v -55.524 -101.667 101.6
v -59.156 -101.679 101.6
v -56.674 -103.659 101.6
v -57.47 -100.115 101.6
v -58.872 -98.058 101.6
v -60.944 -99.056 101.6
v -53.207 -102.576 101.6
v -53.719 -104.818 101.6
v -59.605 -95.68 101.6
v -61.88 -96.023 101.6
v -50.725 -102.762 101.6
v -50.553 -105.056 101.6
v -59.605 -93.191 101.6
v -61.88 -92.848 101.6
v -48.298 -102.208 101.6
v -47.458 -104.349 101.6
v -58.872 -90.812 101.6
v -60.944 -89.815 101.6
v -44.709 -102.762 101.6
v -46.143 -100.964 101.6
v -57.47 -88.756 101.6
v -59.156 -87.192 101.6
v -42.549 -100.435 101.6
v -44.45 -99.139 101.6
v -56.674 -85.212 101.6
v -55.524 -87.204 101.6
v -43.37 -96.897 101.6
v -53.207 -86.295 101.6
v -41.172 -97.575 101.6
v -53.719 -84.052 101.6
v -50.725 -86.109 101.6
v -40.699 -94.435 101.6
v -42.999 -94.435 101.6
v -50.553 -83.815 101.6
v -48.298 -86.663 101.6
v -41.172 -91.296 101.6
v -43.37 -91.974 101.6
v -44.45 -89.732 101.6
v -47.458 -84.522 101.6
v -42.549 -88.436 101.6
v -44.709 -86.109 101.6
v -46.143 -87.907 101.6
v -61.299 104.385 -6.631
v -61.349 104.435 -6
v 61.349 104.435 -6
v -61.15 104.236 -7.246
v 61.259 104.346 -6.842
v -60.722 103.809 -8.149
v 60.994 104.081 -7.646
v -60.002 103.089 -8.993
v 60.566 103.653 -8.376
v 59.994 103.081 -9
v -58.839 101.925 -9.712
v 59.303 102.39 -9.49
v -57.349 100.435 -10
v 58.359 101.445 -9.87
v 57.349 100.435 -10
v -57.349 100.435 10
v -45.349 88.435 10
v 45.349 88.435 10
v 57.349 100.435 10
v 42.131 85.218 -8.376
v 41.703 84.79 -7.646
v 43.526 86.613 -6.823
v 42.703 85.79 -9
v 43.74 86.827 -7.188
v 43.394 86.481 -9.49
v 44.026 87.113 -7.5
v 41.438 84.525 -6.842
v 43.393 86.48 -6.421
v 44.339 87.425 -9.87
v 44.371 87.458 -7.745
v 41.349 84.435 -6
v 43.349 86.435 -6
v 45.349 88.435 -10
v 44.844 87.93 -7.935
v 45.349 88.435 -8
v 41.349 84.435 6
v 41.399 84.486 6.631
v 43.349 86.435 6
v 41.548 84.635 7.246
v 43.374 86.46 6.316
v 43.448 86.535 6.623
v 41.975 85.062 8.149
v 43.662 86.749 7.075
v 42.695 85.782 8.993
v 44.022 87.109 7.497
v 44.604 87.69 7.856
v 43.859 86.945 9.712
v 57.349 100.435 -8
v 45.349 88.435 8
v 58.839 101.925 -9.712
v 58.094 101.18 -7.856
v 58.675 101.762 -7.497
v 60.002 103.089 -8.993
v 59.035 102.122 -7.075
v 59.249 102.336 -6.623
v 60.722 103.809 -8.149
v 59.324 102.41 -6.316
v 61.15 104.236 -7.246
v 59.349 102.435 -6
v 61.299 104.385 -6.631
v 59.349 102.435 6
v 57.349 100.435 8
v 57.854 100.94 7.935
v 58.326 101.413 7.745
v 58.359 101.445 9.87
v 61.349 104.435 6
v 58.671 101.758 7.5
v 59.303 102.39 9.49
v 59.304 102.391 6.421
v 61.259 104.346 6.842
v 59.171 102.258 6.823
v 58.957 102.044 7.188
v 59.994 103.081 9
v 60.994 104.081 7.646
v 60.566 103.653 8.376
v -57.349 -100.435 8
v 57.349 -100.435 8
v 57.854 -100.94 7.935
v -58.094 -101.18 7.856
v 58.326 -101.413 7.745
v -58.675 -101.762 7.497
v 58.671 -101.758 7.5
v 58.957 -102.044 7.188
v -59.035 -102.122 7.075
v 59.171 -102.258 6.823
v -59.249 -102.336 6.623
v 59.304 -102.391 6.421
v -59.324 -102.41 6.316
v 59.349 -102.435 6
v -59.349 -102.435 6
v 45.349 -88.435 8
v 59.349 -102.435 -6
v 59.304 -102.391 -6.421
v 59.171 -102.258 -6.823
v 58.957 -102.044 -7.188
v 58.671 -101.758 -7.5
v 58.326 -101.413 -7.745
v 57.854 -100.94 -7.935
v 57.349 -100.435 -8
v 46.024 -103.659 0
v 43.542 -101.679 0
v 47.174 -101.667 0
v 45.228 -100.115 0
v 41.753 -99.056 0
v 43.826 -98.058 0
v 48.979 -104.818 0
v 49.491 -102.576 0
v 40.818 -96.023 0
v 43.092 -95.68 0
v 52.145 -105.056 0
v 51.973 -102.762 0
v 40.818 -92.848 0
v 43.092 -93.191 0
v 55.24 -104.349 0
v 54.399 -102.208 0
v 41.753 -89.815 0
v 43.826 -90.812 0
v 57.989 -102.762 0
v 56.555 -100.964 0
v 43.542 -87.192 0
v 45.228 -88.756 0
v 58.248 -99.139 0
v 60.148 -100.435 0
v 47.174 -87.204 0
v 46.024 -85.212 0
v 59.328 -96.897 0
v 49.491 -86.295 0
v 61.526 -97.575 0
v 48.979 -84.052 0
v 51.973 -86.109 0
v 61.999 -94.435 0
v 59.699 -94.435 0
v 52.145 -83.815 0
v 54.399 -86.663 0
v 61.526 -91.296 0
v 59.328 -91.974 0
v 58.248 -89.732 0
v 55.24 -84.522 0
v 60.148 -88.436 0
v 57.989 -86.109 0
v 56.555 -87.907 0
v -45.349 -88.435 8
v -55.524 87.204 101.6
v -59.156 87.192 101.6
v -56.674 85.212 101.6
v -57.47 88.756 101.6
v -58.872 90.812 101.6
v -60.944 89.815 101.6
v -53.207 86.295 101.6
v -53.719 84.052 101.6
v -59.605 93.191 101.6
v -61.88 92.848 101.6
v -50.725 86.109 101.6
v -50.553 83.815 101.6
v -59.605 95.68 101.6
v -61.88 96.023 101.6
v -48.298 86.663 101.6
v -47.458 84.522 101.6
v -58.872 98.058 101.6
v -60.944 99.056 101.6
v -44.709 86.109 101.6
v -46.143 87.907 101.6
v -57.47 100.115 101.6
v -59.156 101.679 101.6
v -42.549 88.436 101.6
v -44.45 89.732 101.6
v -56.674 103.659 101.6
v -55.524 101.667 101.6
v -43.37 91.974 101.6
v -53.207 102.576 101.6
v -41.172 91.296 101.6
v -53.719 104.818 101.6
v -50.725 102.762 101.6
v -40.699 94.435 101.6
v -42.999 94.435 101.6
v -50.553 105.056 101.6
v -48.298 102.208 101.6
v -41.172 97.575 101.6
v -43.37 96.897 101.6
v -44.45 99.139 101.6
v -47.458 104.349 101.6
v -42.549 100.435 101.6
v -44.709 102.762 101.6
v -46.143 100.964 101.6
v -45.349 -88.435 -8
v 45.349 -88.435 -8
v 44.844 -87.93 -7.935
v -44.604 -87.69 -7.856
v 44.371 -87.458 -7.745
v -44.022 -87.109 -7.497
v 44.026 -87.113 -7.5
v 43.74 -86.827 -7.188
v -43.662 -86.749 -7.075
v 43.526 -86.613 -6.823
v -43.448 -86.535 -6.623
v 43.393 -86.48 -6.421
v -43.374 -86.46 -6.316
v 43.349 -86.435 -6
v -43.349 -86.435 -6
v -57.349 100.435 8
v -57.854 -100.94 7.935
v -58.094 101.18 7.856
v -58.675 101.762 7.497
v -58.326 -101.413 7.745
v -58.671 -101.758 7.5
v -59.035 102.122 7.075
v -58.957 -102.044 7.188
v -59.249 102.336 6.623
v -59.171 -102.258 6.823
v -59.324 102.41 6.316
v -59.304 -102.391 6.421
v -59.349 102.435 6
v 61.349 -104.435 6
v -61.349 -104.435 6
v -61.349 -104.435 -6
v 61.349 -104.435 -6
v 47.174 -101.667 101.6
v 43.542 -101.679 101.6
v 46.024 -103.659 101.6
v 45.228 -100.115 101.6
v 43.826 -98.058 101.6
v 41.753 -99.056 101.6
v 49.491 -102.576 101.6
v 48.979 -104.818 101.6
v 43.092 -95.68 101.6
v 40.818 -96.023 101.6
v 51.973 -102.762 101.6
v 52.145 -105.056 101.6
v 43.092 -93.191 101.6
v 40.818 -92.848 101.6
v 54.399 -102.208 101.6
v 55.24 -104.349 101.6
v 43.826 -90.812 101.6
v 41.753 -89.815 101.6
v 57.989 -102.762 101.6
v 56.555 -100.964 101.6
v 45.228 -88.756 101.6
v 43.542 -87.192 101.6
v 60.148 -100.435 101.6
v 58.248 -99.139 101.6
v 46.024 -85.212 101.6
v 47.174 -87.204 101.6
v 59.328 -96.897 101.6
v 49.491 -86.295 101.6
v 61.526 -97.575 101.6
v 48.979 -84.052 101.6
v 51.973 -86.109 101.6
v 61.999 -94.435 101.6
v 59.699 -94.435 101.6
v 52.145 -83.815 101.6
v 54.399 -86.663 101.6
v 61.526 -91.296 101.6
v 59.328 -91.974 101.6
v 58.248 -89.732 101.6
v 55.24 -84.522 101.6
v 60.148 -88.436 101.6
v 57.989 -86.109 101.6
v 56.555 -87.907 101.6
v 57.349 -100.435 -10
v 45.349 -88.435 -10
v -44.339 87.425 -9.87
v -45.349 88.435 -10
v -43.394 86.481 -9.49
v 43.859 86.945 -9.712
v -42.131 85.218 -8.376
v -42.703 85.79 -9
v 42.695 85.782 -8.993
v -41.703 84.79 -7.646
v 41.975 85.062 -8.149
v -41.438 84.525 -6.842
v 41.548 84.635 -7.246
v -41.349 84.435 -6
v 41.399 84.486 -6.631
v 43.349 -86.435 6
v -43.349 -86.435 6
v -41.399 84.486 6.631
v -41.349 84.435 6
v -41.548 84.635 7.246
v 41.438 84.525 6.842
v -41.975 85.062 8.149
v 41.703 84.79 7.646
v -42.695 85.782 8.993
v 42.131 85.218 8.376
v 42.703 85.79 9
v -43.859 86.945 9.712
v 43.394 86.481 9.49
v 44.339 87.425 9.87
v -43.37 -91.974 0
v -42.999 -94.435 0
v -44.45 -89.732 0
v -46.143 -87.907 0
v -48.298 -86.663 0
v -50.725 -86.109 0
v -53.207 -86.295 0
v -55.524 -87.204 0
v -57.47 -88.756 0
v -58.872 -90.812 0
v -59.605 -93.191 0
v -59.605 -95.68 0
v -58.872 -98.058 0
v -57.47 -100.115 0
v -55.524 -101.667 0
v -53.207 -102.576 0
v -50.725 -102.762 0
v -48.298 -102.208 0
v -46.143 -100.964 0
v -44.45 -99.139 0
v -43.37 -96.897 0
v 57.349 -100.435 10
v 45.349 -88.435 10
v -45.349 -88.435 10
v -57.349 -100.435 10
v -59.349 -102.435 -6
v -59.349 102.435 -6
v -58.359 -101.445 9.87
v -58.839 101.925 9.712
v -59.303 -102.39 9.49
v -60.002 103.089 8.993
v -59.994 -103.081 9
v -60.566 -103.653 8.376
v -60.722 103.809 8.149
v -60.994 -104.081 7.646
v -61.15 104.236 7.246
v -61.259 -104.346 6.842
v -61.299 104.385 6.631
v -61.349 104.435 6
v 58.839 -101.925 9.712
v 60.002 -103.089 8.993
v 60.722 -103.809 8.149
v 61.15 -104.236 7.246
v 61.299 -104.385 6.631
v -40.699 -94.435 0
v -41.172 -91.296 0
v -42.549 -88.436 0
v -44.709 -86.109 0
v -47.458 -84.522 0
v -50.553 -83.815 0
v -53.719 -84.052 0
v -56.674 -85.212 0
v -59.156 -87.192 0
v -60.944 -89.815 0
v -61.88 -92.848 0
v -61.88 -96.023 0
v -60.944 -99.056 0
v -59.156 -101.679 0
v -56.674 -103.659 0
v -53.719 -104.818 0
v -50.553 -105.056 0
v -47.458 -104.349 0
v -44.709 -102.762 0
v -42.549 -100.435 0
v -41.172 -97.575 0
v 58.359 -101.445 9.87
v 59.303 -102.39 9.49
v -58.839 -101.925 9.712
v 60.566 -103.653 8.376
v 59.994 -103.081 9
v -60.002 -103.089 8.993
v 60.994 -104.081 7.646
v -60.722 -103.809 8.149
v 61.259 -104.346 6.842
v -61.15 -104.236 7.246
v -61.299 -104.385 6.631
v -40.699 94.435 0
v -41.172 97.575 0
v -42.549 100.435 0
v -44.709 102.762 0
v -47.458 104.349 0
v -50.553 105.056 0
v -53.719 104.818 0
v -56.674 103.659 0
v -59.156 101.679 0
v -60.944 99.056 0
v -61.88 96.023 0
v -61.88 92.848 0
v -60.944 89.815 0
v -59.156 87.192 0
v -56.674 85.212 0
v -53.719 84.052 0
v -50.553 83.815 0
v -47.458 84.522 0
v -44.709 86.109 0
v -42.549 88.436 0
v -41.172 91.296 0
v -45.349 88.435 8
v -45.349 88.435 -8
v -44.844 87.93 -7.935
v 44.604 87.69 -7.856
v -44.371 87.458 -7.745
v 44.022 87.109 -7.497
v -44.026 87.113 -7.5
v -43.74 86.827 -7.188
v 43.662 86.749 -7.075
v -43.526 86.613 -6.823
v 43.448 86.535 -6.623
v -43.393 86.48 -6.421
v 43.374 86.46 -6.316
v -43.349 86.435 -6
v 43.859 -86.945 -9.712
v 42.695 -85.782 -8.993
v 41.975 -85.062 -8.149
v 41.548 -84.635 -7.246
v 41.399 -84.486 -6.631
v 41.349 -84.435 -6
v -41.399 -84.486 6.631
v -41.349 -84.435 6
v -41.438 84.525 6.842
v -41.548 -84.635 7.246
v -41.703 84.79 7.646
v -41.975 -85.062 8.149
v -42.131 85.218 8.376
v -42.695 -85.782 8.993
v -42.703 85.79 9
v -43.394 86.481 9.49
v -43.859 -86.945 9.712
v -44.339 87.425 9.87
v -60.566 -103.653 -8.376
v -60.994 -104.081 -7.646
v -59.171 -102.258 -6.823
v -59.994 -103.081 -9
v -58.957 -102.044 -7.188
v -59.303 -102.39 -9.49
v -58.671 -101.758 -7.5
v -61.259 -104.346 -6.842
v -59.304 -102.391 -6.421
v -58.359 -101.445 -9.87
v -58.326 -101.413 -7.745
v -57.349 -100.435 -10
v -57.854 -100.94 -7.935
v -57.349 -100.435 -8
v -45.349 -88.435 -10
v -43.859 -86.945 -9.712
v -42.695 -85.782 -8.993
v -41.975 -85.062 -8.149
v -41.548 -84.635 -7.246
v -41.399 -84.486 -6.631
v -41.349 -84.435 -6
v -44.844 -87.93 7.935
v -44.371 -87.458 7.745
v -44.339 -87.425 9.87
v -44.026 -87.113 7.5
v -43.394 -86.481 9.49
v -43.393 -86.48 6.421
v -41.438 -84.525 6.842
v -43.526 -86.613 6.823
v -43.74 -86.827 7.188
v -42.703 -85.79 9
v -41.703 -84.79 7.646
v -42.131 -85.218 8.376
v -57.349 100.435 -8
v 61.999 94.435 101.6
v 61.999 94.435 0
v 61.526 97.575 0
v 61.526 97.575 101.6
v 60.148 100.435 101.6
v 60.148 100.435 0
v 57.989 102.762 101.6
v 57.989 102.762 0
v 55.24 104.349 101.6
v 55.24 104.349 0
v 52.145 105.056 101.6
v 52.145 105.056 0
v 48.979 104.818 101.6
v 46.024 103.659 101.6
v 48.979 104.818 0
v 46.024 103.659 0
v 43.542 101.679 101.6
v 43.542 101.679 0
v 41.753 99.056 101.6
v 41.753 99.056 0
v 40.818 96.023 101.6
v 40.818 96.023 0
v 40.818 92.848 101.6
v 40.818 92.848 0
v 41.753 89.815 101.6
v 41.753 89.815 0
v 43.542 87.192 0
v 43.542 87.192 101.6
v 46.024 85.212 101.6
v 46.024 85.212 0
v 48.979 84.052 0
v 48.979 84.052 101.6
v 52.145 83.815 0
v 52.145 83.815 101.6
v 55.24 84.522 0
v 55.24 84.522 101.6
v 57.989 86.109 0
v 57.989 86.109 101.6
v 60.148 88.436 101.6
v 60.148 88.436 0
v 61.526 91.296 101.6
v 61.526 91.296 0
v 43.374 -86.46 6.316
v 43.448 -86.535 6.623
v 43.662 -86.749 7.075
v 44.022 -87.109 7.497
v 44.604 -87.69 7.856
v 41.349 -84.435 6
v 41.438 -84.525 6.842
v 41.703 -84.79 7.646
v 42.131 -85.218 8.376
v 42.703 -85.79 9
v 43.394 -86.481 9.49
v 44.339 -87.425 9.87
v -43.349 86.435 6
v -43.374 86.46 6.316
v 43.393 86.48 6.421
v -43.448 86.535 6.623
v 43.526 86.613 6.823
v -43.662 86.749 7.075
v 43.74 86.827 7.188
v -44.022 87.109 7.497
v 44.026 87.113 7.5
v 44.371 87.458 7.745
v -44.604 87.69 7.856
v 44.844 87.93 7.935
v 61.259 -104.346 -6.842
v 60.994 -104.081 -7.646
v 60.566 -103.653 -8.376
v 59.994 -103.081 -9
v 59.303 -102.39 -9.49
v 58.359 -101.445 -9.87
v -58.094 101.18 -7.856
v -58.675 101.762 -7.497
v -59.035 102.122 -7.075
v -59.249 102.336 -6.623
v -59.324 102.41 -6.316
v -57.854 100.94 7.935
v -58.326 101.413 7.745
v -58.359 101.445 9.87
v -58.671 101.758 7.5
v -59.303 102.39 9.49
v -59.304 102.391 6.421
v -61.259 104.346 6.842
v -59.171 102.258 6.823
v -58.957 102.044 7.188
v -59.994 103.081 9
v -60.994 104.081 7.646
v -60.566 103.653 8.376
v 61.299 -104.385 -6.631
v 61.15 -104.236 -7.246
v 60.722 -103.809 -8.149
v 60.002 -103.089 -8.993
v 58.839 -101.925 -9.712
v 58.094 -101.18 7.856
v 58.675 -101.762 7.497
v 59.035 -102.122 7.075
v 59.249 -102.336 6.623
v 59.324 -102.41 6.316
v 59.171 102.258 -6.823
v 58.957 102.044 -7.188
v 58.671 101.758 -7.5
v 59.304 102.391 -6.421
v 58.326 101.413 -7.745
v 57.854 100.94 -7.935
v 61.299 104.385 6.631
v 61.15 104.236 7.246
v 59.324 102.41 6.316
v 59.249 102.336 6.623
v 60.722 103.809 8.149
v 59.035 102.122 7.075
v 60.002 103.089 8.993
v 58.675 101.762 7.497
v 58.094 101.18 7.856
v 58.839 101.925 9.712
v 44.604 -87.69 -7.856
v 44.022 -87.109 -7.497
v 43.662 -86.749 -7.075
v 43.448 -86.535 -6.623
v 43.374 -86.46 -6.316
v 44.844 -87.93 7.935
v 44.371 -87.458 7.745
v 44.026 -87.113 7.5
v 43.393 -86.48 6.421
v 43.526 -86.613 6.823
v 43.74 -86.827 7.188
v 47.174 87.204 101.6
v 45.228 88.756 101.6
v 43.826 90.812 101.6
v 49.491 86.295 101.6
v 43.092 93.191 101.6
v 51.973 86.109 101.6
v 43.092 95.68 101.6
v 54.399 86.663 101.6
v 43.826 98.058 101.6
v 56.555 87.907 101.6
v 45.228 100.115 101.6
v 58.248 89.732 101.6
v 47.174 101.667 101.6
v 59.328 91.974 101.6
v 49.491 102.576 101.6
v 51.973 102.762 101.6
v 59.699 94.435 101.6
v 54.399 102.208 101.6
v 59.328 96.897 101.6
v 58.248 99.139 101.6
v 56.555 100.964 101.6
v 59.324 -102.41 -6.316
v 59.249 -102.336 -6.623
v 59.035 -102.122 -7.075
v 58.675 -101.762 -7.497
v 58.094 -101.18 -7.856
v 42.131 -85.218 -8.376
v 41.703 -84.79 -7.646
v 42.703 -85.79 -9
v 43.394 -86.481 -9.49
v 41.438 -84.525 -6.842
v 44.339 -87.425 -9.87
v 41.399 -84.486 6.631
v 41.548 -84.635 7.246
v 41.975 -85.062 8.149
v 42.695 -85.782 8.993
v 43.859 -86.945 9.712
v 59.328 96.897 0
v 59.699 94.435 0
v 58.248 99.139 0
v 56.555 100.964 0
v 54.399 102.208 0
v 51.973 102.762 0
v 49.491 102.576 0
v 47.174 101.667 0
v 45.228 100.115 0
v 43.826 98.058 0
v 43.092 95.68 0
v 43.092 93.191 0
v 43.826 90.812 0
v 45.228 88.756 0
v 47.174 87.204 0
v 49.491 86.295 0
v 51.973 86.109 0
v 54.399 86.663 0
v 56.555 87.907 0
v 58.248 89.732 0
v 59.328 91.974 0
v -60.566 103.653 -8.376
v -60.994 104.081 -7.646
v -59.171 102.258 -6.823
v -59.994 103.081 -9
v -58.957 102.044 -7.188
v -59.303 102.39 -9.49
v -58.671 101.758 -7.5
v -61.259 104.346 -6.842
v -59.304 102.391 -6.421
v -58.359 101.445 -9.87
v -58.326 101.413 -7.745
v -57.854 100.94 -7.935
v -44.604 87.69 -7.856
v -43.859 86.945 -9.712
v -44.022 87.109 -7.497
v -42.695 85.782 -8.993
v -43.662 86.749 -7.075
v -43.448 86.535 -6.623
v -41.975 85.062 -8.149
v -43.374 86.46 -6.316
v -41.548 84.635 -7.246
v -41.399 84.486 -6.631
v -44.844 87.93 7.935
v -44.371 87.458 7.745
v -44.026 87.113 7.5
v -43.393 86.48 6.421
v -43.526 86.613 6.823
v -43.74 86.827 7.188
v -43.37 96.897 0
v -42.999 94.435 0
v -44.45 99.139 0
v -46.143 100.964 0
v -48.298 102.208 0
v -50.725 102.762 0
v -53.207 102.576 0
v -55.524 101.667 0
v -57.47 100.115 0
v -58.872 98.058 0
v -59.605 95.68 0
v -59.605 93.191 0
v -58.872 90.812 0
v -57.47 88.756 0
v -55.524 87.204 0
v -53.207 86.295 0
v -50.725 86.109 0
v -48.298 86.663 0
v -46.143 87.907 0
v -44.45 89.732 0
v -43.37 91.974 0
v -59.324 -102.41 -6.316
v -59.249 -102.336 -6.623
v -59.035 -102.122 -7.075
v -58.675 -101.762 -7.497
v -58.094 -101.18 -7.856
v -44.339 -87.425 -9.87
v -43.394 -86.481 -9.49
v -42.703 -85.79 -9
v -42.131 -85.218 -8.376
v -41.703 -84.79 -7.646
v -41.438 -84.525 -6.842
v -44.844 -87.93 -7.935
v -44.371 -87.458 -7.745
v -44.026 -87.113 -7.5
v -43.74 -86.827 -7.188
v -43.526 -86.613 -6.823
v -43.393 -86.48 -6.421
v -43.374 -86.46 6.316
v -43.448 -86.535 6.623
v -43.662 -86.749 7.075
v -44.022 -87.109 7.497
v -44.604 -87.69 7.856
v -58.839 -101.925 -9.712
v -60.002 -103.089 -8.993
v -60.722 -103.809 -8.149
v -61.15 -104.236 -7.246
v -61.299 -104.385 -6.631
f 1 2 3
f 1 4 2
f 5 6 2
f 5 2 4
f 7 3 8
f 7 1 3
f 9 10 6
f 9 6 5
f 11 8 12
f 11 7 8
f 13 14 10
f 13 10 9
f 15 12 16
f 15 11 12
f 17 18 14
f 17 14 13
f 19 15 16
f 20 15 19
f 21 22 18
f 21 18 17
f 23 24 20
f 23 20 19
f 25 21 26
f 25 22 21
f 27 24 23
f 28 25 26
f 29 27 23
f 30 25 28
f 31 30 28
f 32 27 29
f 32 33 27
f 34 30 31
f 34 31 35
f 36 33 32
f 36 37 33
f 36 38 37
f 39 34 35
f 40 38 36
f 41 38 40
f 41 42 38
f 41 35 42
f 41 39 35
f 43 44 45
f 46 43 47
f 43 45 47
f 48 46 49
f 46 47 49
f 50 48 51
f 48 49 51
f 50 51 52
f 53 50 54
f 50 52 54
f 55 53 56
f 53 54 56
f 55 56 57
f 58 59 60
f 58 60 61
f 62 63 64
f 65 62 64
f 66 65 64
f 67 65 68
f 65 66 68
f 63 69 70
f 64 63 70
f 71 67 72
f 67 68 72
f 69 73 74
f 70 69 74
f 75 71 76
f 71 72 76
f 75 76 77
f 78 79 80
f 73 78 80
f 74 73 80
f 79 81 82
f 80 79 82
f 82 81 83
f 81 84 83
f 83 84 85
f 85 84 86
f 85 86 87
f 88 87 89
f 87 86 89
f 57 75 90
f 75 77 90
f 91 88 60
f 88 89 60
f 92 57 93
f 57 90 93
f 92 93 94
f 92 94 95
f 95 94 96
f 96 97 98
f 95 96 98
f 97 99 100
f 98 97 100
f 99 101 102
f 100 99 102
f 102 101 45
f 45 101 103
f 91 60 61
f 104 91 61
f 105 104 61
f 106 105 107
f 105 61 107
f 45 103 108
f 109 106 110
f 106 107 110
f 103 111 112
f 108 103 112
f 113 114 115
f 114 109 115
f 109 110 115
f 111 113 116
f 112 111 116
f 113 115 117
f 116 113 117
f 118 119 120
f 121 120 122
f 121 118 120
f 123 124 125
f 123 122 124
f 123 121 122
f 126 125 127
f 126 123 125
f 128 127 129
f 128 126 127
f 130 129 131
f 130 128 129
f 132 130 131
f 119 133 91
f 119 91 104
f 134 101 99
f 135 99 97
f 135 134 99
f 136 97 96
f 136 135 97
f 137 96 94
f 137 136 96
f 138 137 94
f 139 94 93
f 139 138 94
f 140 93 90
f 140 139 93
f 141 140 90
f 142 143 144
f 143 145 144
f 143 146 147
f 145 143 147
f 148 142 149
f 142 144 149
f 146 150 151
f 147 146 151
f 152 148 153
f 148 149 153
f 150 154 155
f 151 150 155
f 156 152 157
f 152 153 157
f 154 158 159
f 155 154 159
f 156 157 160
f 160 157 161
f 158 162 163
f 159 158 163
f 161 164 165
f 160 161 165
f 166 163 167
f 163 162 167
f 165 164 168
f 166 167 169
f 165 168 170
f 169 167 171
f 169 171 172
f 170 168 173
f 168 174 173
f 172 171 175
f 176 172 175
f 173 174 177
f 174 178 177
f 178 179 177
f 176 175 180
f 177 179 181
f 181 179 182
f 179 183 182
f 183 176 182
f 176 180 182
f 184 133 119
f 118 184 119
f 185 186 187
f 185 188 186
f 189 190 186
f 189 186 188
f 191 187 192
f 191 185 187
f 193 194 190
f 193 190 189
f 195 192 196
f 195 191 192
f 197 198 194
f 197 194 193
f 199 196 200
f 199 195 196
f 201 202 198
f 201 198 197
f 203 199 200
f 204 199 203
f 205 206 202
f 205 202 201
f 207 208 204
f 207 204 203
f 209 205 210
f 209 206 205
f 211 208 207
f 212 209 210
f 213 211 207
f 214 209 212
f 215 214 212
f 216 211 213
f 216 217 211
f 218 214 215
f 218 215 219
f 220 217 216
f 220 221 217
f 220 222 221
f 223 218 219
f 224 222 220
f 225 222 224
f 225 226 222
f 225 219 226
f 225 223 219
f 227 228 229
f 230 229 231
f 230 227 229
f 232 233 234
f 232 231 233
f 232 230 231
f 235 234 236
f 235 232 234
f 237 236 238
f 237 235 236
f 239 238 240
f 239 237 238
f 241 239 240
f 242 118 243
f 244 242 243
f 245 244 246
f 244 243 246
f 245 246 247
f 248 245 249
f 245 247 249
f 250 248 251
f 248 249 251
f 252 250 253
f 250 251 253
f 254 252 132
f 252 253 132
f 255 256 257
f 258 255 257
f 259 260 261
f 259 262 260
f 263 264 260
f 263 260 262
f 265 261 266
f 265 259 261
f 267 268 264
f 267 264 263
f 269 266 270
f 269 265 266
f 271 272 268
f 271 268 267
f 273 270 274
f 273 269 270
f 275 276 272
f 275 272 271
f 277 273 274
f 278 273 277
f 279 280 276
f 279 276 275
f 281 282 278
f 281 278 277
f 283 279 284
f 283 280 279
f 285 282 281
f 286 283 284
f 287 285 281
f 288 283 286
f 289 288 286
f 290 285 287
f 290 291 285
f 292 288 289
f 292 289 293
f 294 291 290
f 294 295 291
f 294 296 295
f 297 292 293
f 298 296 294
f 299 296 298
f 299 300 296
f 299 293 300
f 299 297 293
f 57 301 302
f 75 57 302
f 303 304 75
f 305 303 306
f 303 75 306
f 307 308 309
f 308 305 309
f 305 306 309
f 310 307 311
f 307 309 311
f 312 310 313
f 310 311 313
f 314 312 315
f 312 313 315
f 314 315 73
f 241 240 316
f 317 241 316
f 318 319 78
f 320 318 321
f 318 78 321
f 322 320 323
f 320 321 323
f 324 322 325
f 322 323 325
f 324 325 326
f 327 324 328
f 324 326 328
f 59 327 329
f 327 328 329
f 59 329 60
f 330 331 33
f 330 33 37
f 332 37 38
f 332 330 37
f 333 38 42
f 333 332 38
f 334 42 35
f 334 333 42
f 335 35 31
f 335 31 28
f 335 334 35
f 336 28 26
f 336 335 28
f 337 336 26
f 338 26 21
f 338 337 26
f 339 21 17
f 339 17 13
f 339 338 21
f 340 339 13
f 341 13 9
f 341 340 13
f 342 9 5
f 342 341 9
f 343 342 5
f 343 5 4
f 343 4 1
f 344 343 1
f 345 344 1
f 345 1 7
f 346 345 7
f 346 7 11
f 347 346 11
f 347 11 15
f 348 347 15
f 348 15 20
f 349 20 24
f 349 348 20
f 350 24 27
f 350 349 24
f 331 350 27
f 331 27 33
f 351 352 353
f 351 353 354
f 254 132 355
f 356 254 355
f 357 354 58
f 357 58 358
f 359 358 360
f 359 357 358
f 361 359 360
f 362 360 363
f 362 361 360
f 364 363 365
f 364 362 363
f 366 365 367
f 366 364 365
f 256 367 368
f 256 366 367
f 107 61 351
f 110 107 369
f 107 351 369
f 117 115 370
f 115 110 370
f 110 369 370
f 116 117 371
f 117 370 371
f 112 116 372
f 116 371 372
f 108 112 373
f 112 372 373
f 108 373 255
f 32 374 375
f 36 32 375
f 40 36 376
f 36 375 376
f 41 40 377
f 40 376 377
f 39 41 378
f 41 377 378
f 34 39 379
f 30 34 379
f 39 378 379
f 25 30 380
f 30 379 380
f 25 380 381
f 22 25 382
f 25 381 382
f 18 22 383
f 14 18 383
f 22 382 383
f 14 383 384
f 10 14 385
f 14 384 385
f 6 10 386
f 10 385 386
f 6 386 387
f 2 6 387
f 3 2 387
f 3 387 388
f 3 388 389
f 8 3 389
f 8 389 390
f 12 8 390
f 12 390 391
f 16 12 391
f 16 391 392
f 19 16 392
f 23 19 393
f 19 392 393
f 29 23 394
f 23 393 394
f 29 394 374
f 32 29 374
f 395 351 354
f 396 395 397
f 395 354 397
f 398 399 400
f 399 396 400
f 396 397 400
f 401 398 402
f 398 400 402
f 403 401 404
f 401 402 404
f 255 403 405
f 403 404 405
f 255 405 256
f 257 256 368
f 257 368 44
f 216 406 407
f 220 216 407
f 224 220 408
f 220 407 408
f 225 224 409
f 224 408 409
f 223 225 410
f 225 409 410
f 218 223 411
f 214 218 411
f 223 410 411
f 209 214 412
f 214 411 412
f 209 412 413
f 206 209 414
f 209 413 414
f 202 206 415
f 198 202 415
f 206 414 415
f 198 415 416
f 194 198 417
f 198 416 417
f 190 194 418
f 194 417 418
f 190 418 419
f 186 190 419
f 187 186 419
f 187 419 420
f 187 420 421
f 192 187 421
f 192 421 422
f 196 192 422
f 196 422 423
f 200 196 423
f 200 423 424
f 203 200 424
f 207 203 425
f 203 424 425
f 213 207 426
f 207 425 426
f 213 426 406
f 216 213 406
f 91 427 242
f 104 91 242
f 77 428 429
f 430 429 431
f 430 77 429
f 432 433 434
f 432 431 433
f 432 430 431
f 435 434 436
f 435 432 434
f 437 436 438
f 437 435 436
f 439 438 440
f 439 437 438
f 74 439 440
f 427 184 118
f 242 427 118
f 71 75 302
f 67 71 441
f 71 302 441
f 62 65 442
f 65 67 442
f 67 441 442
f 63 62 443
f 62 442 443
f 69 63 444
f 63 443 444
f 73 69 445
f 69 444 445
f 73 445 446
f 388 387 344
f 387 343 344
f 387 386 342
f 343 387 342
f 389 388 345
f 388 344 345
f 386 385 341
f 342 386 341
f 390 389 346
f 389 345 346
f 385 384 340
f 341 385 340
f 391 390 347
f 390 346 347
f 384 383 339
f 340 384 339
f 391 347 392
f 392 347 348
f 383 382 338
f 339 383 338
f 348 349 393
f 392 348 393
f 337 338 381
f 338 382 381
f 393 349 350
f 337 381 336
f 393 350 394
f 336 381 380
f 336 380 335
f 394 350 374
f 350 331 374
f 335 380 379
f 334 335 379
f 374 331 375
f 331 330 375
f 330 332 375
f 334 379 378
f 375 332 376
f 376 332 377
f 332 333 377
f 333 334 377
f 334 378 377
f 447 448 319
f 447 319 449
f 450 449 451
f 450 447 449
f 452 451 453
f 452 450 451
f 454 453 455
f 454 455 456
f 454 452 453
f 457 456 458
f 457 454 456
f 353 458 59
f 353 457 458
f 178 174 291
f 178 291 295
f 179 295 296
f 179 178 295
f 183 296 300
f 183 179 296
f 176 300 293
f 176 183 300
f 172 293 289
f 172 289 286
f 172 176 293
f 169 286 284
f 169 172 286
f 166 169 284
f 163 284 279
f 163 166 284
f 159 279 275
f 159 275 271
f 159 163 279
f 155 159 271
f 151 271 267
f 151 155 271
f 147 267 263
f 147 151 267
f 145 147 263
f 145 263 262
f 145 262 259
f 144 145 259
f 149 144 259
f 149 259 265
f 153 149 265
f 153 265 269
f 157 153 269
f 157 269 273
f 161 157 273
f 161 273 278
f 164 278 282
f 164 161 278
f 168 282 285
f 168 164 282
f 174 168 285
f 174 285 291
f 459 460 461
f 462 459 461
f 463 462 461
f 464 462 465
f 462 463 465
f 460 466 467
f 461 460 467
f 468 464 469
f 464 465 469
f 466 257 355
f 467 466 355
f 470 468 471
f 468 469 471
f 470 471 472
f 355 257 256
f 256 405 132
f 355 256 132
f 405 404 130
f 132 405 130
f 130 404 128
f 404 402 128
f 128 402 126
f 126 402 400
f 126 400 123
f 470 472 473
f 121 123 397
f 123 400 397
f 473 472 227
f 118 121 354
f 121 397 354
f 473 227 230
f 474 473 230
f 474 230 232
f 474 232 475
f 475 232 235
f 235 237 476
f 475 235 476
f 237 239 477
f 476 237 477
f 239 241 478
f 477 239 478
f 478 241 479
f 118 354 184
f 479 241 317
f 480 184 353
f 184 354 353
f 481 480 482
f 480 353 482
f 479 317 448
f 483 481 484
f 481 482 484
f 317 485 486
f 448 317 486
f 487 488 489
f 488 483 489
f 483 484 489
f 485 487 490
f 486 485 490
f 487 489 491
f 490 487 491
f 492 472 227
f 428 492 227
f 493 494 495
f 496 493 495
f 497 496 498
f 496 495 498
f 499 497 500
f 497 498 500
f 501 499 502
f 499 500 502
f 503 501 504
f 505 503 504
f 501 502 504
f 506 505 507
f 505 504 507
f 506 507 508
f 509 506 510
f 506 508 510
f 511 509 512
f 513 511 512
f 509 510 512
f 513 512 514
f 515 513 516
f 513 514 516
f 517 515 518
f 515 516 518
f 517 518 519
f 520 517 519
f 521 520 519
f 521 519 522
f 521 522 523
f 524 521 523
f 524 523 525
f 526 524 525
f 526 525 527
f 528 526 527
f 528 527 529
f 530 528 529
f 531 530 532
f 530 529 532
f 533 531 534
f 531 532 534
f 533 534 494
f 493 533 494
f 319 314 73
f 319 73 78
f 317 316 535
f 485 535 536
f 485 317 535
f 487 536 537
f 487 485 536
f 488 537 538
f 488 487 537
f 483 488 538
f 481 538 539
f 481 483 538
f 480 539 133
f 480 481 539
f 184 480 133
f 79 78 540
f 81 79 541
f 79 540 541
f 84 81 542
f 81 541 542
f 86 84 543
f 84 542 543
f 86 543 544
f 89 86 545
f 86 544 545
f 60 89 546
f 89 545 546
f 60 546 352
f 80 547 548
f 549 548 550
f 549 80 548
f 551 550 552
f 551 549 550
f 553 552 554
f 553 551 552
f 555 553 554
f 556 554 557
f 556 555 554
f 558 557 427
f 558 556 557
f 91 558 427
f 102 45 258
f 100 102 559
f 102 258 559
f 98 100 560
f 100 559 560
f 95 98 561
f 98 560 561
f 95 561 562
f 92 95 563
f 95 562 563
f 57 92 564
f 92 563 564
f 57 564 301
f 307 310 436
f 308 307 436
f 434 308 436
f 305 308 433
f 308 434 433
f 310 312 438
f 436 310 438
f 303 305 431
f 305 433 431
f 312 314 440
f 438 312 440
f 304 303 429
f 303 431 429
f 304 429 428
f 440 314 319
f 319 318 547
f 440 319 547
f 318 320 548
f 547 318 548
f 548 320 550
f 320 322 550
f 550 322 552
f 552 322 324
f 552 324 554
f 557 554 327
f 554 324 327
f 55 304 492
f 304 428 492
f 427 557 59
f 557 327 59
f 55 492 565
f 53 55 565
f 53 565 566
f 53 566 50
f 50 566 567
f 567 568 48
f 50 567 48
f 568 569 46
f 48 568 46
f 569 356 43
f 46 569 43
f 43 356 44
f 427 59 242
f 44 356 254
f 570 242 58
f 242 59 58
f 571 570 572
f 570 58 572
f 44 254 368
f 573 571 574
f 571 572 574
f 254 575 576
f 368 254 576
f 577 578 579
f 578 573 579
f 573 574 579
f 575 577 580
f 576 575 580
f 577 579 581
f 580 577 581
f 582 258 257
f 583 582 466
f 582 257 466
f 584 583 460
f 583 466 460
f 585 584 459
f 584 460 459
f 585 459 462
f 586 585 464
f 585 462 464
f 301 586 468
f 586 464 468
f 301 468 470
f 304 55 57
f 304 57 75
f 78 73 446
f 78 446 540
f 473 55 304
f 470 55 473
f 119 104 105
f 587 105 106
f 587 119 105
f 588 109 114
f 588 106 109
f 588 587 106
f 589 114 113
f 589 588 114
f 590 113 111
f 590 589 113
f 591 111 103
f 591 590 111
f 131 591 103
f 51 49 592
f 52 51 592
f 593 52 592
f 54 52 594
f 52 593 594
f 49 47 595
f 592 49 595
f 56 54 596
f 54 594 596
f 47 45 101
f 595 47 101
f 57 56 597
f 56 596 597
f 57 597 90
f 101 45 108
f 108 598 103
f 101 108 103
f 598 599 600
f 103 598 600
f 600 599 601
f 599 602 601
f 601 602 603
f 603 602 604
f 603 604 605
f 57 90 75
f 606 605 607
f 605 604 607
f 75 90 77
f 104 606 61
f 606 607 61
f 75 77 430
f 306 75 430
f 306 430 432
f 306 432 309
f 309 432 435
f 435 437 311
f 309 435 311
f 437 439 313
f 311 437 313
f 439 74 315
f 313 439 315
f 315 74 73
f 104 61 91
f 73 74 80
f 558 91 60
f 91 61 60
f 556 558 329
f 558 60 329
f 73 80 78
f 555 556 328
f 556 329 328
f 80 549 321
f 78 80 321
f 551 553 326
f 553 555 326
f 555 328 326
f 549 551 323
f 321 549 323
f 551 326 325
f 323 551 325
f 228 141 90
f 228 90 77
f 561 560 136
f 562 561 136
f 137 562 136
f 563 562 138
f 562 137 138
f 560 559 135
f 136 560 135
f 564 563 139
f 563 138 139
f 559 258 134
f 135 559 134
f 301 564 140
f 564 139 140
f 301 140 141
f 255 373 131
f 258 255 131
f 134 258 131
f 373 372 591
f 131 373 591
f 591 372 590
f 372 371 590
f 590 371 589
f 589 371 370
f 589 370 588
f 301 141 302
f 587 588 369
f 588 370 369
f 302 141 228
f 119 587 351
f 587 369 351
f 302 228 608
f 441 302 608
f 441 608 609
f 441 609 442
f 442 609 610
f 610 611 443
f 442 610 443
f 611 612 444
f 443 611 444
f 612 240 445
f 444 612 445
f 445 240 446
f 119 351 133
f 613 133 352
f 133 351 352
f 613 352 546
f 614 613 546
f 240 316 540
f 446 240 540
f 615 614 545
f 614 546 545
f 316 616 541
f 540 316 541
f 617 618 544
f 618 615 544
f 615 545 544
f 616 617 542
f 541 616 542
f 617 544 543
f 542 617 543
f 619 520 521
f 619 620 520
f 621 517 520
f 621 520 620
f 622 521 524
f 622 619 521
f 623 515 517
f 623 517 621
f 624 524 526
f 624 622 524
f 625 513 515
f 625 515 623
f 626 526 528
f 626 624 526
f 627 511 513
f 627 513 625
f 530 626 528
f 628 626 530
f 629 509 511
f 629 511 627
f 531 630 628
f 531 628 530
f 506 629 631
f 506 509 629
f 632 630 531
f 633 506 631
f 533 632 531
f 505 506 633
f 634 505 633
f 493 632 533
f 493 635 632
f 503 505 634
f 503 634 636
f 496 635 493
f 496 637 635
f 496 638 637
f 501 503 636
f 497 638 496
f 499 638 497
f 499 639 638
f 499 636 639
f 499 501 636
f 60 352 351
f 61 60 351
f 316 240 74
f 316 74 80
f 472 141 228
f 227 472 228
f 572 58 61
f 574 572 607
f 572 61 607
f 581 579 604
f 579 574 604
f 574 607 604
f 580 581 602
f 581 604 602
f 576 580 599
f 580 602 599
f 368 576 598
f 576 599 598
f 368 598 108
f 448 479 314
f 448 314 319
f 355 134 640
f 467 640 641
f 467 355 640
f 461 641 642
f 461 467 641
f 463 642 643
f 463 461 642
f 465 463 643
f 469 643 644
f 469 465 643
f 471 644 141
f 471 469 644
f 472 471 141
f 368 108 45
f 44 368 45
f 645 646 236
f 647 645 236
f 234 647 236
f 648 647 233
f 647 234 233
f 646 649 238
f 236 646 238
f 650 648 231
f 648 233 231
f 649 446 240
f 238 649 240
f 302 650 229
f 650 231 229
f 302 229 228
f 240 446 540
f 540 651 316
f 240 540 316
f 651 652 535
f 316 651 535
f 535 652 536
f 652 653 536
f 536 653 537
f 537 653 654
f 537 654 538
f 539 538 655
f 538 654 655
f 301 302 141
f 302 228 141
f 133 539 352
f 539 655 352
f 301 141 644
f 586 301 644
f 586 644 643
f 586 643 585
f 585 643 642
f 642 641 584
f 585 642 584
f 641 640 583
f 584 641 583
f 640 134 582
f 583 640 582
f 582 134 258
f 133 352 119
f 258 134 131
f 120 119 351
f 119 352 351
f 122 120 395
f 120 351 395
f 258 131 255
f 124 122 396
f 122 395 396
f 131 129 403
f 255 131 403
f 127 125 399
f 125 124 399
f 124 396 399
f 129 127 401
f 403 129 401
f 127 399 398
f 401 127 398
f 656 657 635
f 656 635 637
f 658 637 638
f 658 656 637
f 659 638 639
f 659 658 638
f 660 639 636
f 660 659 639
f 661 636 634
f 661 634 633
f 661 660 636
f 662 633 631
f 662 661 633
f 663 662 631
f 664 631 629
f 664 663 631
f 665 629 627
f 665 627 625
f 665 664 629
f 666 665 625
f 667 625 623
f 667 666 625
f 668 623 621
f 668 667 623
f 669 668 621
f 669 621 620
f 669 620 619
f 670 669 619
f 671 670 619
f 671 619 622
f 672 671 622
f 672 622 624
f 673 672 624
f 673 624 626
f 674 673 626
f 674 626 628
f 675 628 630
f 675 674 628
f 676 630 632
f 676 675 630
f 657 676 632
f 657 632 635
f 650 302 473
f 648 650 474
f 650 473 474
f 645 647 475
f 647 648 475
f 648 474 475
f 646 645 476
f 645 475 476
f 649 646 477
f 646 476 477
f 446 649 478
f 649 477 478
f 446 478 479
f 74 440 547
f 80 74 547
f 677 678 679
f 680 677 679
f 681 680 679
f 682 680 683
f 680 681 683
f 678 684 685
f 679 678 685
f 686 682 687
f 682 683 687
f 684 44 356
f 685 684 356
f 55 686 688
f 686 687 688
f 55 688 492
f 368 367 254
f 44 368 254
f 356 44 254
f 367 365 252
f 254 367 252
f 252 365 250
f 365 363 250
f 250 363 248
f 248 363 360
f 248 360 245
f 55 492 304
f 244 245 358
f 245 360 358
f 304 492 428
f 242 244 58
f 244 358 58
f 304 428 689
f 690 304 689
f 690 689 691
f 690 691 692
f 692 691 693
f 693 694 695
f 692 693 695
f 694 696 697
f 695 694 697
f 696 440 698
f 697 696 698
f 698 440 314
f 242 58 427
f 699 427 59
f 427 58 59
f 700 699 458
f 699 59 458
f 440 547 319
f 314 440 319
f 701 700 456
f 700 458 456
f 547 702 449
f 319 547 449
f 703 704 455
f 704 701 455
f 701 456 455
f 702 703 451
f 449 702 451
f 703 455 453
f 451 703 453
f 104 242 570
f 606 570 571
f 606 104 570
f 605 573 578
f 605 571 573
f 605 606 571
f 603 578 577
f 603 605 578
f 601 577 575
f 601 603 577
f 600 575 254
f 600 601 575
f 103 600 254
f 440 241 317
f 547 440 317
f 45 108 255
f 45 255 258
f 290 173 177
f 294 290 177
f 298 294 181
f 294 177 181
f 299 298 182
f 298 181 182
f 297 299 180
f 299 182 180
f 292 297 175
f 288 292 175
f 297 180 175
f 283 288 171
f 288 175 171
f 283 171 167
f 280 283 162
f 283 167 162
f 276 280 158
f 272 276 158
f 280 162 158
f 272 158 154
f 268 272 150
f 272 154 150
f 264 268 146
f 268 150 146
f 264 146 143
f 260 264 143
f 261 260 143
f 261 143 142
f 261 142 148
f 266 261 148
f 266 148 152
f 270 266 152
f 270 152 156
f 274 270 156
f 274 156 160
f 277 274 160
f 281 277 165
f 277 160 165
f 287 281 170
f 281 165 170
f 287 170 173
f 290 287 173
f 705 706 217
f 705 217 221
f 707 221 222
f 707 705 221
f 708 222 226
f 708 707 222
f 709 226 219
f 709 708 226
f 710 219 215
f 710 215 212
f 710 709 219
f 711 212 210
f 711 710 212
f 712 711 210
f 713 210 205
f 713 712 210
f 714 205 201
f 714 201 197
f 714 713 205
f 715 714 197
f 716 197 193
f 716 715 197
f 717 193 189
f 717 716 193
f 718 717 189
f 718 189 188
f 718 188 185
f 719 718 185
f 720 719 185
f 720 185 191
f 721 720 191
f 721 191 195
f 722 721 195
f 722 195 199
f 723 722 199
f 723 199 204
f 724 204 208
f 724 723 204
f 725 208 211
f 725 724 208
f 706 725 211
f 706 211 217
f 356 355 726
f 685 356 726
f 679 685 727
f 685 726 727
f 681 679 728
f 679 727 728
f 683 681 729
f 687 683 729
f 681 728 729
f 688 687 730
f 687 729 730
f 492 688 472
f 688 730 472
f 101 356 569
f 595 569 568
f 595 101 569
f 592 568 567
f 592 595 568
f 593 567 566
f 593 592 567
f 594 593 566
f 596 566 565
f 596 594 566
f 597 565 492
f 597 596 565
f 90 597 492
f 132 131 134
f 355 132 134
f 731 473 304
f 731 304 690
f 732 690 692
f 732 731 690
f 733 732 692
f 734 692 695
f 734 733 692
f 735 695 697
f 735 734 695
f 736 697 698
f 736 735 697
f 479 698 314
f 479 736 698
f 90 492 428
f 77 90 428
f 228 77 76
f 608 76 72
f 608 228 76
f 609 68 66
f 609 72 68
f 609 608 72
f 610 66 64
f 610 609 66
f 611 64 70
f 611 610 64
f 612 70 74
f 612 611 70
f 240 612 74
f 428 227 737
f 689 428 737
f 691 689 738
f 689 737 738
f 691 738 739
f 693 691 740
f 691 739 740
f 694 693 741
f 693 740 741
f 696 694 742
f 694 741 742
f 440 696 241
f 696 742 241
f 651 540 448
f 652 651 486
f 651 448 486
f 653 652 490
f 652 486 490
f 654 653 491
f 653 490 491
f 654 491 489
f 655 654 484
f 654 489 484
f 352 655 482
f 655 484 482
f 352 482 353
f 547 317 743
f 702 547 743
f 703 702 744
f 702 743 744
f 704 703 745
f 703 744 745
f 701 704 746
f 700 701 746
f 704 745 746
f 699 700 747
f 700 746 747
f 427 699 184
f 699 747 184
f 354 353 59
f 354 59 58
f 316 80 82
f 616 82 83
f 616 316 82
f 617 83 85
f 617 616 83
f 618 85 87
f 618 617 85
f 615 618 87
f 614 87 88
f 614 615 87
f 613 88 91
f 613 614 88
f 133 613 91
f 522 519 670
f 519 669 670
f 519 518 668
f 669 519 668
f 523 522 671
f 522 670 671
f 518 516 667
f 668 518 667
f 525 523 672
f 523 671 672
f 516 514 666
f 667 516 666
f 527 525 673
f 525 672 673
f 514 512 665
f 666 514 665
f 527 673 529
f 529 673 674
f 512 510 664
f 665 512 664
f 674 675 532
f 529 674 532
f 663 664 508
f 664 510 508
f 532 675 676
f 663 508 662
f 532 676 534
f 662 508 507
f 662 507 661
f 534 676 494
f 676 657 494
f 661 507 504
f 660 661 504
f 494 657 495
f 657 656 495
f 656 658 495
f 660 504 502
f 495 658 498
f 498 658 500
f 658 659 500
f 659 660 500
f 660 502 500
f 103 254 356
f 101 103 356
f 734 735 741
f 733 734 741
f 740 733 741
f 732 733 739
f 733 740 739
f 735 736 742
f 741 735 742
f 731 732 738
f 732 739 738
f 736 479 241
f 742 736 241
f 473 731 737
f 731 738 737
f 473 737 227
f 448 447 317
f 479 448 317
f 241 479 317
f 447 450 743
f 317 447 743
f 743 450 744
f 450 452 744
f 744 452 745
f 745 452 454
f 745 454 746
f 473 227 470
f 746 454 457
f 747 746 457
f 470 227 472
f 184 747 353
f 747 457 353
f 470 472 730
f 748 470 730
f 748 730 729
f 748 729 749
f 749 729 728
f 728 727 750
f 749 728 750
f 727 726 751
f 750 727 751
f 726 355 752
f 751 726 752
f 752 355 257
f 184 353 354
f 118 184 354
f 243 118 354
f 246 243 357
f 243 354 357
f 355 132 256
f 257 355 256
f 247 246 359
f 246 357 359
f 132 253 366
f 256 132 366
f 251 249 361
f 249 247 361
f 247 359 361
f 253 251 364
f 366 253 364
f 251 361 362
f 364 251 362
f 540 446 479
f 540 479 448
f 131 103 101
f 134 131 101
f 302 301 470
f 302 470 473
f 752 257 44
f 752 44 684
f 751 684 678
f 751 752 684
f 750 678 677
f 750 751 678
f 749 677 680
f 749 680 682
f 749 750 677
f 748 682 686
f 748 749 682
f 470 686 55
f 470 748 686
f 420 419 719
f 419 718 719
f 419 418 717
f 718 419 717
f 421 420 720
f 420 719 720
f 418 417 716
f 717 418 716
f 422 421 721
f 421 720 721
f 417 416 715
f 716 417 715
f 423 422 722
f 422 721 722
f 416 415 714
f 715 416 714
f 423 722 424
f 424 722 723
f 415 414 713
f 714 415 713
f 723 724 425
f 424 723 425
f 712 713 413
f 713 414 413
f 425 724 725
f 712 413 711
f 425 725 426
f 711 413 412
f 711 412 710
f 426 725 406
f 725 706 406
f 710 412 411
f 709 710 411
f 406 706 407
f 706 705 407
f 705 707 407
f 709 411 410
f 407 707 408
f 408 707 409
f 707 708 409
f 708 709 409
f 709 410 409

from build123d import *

# Parameters (mm, degrees)
STRUCTURAL_MEMBER1_DEPTH      = 204.012968698
STRUCTURAL_MEMBER1_DEPTH_BACK = 15.142135624
STRUCTURAL_MEMBER1_2_DEPTH    = 132.981628501
STRUCTURAL_MEMBER1_3_DEPTH    = 219.155104322
STRUCTURAL_MEMBER1_4_DEPTH    = 132.981628501
SKETCH19_R                    = 10.65
SKETCH19_R_2                  = 8.35
STRUCTURAL_MEMBER2_DEPTH      = 101.6
SKETCH19_ON_SEGMENT_2_R       = 10.65
SKETCH19_ON_SEGMENT_2_R_2     = 8.35
STRUCTURAL_MEMBER2_2_DEPTH    = 101.6
SKETCH19_ON_SEGMENT_3_R       = 10.65
SKETCH19_ON_SEGMENT_3_R_2     = 8.35
STRUCTURAL_MEMBER2_3_DEPTH    = 101.6
SKETCH19_ON_SEGMENT_4_R       = 10.65
SKETCH19_ON_SEGMENT_4_R_2     = 8.35
STRUCTURAL_MEMBER2_4_DEPTH    = 101.6


with BuildPart() as part:
    # Sketch18 → Structural Member1 (new, two sides)
    with BuildSketch(Plane(origin=(-51.348678627, 94.435416537, 0), x_dir=(1, 0, 0), z_dir=(0, -1, 0))) as structural_member1_sk:
        with BuildLine():
            Line((-6, -10), (6, -10))
            ThreePointArc((6, -10), (8.828427125, -8.828427125), (10, -6))
            Line((10, -6), (10, 6))
            ThreePointArc((10, 6), (8.828427125, 8.828427125), (6, 10))
            Line((6, 10), (-6, 10))
            ThreePointArc((-6, 10), (-8.828427125, 8.828427125), (-10, 6))
            Line((-10, 6), (-10, -6))
            ThreePointArc((-10, -6), (-8.828427125, -8.828427125), (-6, -10))
        make_face()
        with BuildLine():
            Line((-6, -8), (6, -8))
            ThreePointArc((6, -8), (7.414213562, -7.414213562), (8, -6))
            Line((8, -6), (8, 6))
            ThreePointArc((8, 6), (7.414213562, 7.414213562), (6, 8))
            Line((6, 8), (-6, 8))
            ThreePointArc((-6, 8), (-7.414213562, 7.414213562), (-8, 6))
            Line((-8, 6), (-8, -6))
            ThreePointArc((-8, -6), (-7.414213562, -7.414213562), (-6, -8))
        make_face(mode=Mode.SUBTRACT)
    extrude(amount=STRUCTURAL_MEMBER1_DEPTH)
    extrude(structural_member1_sk.sketch, amount=-STRUCTURAL_MEMBER1_DEPTH_BACK)

    # Structural Member1 mitre 1
    split(bisect_by=Plane(origin=(-51.348678627, 94.435416537, 0), x_dir=(0.707106781, -0.707106781, 0), z_dir=(-0.707106781, -0.707106781, 0)), keep=Keep.TOP)

    # Structural Member1 mitre 2
    split(bisect_by=Plane(origin=(-51.348678627, -94.435416537, 0), x_dir=(-0.707106781, -0.707106781, 0), z_dir=(-0.707106781, 0.707106781, 0)), keep=Keep.TOP)


with BuildPart() as body_2:
    # Sketch18 on segment 2 (carried to segment 2) → Structural Member1 2 (new body)
    with BuildSketch(Plane(origin=(-66.490814251, -94.435416537, 0), x_dir=(0, 1, 0), z_dir=(1, 0, 0))):
        with BuildLine():
            Line((-6, -10), (6, -10))
            ThreePointArc((6, -10), (8.828427125, -8.828427125), (10, -6))
            Line((10, -6), (10, 6))
            ThreePointArc((10, 6), (8.828427125, 8.828427125), (6, 10))
            Line((6, 10), (-6, 10))
            ThreePointArc((-6, 10), (-8.828427125, 8.828427125), (-10, 6))
            Line((-10, 6), (-10, -6))
            ThreePointArc((-10, -6), (-8.828427125, -8.828427125), (-6, -10))
        make_face()
        with BuildLine():
            Line((-6, -8), (6, -8))
            ThreePointArc((6, -8), (7.414213562, -7.414213562), (8, -6))
            Line((8, -6), (8, 6))
            ThreePointArc((8, 6), (7.414213562, 7.414213562), (6, 8))
            Line((6, 8), (-6, 8))
            ThreePointArc((-6, 8), (-7.414213562, 7.414213562), (-8, 6))
            Line((-8, 6), (-8, -6))
            ThreePointArc((-8, -6), (-7.414213562, -7.414213562), (-6, -8))
        make_face(mode=Mode.SUBTRACT)
    extrude(amount=STRUCTURAL_MEMBER1_2_DEPTH)

    # Structural Member1 2 mitre 1
    split(bisect_by=Plane(origin=(-51.348678627, -94.435416537, 0), x_dir=(0.707106781, 0.707106781, 0), z_dir=(0.707106781, -0.707106781, 0)), keep=Keep.TOP)

    # Structural Member1 2 mitre 2
    split(bisect_by=Plane(origin=(51.348678627, -94.435416537, 0), x_dir=(0.707106781, -0.707106781, 0), z_dir=(-0.707106781, -0.707106781, 0)), keep=Keep.TOP)


with BuildPart() as body_3:
    # Sketch18 on segment 3 (carried to segment 3) → Structural Member1 3 (new body)
    with BuildSketch(Plane(origin=(51.348678627, -109.577552161, 0), x_dir=(-1, 0, 0), z_dir=(0, 1, 0))):
        with BuildLine():
            Line((-6, -10), (6, -10))
            ThreePointArc((6, -10), (8.828427125, -8.828427125), (10, -6))
            Line((10, -6), (10, 6))
            ThreePointArc((10, 6), (8.828427125, 8.828427125), (6, 10))
            Line((6, 10), (-6, 10))
            ThreePointArc((-6, 10), (-8.828427125, 8.828427125), (-10, 6))
            Line((-10, 6), (-10, -6))
            ThreePointArc((-10, -6), (-8.828427125, -8.828427125), (-6, -10))
        make_face()
        with BuildLine():
            Line((-6, -8), (6, -8))
            ThreePointArc((6, -8), (7.414213562, -7.414213562), (8, -6))
            Line((8, -6), (8, 6))
            ThreePointArc((8, 6), (7.414213562, 7.414213562), (6, 8))
            Line((6, 8), (-6, 8))
            ThreePointArc((-6, 8), (-7.414213562, 7.414213562), (-8, 6))
            Line((-8, 6), (-8, -6))
            ThreePointArc((-8, -6), (-7.414213562, -7.414213562), (-6, -8))
        make_face(mode=Mode.SUBTRACT)
    extrude(amount=STRUCTURAL_MEMBER1_3_DEPTH)

    # Structural Member1 3 mitre 1
    split(bisect_by=Plane(origin=(51.348678627, 94.435416537, 0), x_dir=(0.707106781, 0.707106781, 0), z_dir=(0.707106781, -0.707106781, 0)), keep=Keep.TOP)

    # Structural Member1 3 mitre 2
    split(bisect_by=Plane(origin=(51.348678627, -94.435416537, 0), x_dir=(-0.707106781, 0.707106781, 0), z_dir=(0.707106781, 0.707106781, 0)), keep=Keep.TOP)


with BuildPart() as body_4:
    # Sketch18 on segment 4 (carried to segment 4) → Structural Member1 4 (new body)
    with BuildSketch(Plane(origin=(66.490814251, 94.435416537, 0), x_dir=(0, -1, 0), z_dir=(-1, 0, 0))):
        with BuildLine():
            Line((-6, -10), (6, -10))
            ThreePointArc((6, -10), (8.828427125, -8.828427125), (10, -6))
            Line((10, -6), (10, 6))
            ThreePointArc((10, 6), (8.828427125, 8.828427125), (6, 10))
            Line((6, 10), (-6, 10))
            ThreePointArc((-6, 10), (-8.828427125, 8.828427125), (-10, 6))
            Line((-10, 6), (-10, -6))
            ThreePointArc((-10, -6), (-8.828427125, -8.828427125), (-6, -10))
        make_face()
        with BuildLine():
            Line((-6, -8), (6, -8))
            ThreePointArc((6, -8), (7.414213562, -7.414213562), (8, -6))
            Line((8, -6), (8, 6))
            ThreePointArc((8, 6), (7.414213562, 7.414213562), (6, 8))
            Line((6, 8), (-6, 8))
            ThreePointArc((-6, 8), (-7.414213562, 7.414213562), (-8, 6))
            Line((-8, 6), (-8, -6))
            ThreePointArc((-8, -6), (-7.414213562, -7.414213562), (-6, -8))
        make_face(mode=Mode.SUBTRACT)
    extrude(amount=STRUCTURAL_MEMBER1_4_DEPTH)

    # Structural Member1 4 mitre 1
    split(bisect_by=Plane(origin=(-51.348678627, 94.435416537, 0), x_dir=(-0.707106781, 0.707106781, 0), z_dir=(0.707106781, 0.707106781, 0)), keep=Keep.TOP)

    # Structural Member1 4 mitre 2
    split(bisect_by=Plane(origin=(51.348678627, 94.435416537, 0), x_dir=(-0.707106781, -0.707106781, 0), z_dir=(-0.707106781, 0.707106781, 0)), keep=Keep.TOP)


with BuildPart() as body_5:
    # Sketch19 → Structural Member2 (new body)
    with BuildSketch(Plane(origin=(-51.348678627, 94.435416537, 0), x_dir=(1, 0, 0), z_dir=(0, 0, 1))):
        Circle(SKETCH19_R)
        Circle(SKETCH19_R_2, mode=Mode.SUBTRACT)
    extrude(amount=STRUCTURAL_MEMBER2_DEPTH)


with BuildPart() as body_6:
    # Sketch19 on segment 2 (carried to segment 2) → Structural Member2 2 (new body)
    with BuildSketch(Plane(origin=(-51.348678627, -94.435416537, 0), x_dir=(1, 0, 0), z_dir=(0, 0, 1))):
        Circle(SKETCH19_ON_SEGMENT_2_R)
        Circle(SKETCH19_ON_SEGMENT_2_R_2, mode=Mode.SUBTRACT)
    extrude(amount=STRUCTURAL_MEMBER2_2_DEPTH)


with BuildPart() as body_7:
    # Sketch19 on segment 3 (carried to segment 3) → Structural Member2 3 (new body)
    with BuildSketch(Plane(origin=(51.348678627, 94.435416537, 0), x_dir=(1, 0, 0), z_dir=(0, 0, 1))):
        Circle(SKETCH19_ON_SEGMENT_3_R)
        Circle(SKETCH19_ON_SEGMENT_3_R_2, mode=Mode.SUBTRACT)
    extrude(amount=STRUCTURAL_MEMBER2_3_DEPTH)


with BuildPart() as body_8:
    # Sketch19 on segment 4 (carried to segment 4) → Structural Member2 4 (new body)
    with BuildSketch(Plane(origin=(51.348678627, -94.435416537, 0), x_dir=(1, 0, 0), z_dir=(0, 0, 1))):
        Circle(SKETCH19_ON_SEGMENT_4_R)
        Circle(SKETCH19_ON_SEGMENT_4_R_2, mode=Mode.SUBTRACT)
    extrude(amount=STRUCTURAL_MEMBER2_4_DEPTH)


solid = Compound([part.part, body_2.part, body_3.part, body_4.part, body_5.part, body_6.part, body_7.part, body_8.part])
